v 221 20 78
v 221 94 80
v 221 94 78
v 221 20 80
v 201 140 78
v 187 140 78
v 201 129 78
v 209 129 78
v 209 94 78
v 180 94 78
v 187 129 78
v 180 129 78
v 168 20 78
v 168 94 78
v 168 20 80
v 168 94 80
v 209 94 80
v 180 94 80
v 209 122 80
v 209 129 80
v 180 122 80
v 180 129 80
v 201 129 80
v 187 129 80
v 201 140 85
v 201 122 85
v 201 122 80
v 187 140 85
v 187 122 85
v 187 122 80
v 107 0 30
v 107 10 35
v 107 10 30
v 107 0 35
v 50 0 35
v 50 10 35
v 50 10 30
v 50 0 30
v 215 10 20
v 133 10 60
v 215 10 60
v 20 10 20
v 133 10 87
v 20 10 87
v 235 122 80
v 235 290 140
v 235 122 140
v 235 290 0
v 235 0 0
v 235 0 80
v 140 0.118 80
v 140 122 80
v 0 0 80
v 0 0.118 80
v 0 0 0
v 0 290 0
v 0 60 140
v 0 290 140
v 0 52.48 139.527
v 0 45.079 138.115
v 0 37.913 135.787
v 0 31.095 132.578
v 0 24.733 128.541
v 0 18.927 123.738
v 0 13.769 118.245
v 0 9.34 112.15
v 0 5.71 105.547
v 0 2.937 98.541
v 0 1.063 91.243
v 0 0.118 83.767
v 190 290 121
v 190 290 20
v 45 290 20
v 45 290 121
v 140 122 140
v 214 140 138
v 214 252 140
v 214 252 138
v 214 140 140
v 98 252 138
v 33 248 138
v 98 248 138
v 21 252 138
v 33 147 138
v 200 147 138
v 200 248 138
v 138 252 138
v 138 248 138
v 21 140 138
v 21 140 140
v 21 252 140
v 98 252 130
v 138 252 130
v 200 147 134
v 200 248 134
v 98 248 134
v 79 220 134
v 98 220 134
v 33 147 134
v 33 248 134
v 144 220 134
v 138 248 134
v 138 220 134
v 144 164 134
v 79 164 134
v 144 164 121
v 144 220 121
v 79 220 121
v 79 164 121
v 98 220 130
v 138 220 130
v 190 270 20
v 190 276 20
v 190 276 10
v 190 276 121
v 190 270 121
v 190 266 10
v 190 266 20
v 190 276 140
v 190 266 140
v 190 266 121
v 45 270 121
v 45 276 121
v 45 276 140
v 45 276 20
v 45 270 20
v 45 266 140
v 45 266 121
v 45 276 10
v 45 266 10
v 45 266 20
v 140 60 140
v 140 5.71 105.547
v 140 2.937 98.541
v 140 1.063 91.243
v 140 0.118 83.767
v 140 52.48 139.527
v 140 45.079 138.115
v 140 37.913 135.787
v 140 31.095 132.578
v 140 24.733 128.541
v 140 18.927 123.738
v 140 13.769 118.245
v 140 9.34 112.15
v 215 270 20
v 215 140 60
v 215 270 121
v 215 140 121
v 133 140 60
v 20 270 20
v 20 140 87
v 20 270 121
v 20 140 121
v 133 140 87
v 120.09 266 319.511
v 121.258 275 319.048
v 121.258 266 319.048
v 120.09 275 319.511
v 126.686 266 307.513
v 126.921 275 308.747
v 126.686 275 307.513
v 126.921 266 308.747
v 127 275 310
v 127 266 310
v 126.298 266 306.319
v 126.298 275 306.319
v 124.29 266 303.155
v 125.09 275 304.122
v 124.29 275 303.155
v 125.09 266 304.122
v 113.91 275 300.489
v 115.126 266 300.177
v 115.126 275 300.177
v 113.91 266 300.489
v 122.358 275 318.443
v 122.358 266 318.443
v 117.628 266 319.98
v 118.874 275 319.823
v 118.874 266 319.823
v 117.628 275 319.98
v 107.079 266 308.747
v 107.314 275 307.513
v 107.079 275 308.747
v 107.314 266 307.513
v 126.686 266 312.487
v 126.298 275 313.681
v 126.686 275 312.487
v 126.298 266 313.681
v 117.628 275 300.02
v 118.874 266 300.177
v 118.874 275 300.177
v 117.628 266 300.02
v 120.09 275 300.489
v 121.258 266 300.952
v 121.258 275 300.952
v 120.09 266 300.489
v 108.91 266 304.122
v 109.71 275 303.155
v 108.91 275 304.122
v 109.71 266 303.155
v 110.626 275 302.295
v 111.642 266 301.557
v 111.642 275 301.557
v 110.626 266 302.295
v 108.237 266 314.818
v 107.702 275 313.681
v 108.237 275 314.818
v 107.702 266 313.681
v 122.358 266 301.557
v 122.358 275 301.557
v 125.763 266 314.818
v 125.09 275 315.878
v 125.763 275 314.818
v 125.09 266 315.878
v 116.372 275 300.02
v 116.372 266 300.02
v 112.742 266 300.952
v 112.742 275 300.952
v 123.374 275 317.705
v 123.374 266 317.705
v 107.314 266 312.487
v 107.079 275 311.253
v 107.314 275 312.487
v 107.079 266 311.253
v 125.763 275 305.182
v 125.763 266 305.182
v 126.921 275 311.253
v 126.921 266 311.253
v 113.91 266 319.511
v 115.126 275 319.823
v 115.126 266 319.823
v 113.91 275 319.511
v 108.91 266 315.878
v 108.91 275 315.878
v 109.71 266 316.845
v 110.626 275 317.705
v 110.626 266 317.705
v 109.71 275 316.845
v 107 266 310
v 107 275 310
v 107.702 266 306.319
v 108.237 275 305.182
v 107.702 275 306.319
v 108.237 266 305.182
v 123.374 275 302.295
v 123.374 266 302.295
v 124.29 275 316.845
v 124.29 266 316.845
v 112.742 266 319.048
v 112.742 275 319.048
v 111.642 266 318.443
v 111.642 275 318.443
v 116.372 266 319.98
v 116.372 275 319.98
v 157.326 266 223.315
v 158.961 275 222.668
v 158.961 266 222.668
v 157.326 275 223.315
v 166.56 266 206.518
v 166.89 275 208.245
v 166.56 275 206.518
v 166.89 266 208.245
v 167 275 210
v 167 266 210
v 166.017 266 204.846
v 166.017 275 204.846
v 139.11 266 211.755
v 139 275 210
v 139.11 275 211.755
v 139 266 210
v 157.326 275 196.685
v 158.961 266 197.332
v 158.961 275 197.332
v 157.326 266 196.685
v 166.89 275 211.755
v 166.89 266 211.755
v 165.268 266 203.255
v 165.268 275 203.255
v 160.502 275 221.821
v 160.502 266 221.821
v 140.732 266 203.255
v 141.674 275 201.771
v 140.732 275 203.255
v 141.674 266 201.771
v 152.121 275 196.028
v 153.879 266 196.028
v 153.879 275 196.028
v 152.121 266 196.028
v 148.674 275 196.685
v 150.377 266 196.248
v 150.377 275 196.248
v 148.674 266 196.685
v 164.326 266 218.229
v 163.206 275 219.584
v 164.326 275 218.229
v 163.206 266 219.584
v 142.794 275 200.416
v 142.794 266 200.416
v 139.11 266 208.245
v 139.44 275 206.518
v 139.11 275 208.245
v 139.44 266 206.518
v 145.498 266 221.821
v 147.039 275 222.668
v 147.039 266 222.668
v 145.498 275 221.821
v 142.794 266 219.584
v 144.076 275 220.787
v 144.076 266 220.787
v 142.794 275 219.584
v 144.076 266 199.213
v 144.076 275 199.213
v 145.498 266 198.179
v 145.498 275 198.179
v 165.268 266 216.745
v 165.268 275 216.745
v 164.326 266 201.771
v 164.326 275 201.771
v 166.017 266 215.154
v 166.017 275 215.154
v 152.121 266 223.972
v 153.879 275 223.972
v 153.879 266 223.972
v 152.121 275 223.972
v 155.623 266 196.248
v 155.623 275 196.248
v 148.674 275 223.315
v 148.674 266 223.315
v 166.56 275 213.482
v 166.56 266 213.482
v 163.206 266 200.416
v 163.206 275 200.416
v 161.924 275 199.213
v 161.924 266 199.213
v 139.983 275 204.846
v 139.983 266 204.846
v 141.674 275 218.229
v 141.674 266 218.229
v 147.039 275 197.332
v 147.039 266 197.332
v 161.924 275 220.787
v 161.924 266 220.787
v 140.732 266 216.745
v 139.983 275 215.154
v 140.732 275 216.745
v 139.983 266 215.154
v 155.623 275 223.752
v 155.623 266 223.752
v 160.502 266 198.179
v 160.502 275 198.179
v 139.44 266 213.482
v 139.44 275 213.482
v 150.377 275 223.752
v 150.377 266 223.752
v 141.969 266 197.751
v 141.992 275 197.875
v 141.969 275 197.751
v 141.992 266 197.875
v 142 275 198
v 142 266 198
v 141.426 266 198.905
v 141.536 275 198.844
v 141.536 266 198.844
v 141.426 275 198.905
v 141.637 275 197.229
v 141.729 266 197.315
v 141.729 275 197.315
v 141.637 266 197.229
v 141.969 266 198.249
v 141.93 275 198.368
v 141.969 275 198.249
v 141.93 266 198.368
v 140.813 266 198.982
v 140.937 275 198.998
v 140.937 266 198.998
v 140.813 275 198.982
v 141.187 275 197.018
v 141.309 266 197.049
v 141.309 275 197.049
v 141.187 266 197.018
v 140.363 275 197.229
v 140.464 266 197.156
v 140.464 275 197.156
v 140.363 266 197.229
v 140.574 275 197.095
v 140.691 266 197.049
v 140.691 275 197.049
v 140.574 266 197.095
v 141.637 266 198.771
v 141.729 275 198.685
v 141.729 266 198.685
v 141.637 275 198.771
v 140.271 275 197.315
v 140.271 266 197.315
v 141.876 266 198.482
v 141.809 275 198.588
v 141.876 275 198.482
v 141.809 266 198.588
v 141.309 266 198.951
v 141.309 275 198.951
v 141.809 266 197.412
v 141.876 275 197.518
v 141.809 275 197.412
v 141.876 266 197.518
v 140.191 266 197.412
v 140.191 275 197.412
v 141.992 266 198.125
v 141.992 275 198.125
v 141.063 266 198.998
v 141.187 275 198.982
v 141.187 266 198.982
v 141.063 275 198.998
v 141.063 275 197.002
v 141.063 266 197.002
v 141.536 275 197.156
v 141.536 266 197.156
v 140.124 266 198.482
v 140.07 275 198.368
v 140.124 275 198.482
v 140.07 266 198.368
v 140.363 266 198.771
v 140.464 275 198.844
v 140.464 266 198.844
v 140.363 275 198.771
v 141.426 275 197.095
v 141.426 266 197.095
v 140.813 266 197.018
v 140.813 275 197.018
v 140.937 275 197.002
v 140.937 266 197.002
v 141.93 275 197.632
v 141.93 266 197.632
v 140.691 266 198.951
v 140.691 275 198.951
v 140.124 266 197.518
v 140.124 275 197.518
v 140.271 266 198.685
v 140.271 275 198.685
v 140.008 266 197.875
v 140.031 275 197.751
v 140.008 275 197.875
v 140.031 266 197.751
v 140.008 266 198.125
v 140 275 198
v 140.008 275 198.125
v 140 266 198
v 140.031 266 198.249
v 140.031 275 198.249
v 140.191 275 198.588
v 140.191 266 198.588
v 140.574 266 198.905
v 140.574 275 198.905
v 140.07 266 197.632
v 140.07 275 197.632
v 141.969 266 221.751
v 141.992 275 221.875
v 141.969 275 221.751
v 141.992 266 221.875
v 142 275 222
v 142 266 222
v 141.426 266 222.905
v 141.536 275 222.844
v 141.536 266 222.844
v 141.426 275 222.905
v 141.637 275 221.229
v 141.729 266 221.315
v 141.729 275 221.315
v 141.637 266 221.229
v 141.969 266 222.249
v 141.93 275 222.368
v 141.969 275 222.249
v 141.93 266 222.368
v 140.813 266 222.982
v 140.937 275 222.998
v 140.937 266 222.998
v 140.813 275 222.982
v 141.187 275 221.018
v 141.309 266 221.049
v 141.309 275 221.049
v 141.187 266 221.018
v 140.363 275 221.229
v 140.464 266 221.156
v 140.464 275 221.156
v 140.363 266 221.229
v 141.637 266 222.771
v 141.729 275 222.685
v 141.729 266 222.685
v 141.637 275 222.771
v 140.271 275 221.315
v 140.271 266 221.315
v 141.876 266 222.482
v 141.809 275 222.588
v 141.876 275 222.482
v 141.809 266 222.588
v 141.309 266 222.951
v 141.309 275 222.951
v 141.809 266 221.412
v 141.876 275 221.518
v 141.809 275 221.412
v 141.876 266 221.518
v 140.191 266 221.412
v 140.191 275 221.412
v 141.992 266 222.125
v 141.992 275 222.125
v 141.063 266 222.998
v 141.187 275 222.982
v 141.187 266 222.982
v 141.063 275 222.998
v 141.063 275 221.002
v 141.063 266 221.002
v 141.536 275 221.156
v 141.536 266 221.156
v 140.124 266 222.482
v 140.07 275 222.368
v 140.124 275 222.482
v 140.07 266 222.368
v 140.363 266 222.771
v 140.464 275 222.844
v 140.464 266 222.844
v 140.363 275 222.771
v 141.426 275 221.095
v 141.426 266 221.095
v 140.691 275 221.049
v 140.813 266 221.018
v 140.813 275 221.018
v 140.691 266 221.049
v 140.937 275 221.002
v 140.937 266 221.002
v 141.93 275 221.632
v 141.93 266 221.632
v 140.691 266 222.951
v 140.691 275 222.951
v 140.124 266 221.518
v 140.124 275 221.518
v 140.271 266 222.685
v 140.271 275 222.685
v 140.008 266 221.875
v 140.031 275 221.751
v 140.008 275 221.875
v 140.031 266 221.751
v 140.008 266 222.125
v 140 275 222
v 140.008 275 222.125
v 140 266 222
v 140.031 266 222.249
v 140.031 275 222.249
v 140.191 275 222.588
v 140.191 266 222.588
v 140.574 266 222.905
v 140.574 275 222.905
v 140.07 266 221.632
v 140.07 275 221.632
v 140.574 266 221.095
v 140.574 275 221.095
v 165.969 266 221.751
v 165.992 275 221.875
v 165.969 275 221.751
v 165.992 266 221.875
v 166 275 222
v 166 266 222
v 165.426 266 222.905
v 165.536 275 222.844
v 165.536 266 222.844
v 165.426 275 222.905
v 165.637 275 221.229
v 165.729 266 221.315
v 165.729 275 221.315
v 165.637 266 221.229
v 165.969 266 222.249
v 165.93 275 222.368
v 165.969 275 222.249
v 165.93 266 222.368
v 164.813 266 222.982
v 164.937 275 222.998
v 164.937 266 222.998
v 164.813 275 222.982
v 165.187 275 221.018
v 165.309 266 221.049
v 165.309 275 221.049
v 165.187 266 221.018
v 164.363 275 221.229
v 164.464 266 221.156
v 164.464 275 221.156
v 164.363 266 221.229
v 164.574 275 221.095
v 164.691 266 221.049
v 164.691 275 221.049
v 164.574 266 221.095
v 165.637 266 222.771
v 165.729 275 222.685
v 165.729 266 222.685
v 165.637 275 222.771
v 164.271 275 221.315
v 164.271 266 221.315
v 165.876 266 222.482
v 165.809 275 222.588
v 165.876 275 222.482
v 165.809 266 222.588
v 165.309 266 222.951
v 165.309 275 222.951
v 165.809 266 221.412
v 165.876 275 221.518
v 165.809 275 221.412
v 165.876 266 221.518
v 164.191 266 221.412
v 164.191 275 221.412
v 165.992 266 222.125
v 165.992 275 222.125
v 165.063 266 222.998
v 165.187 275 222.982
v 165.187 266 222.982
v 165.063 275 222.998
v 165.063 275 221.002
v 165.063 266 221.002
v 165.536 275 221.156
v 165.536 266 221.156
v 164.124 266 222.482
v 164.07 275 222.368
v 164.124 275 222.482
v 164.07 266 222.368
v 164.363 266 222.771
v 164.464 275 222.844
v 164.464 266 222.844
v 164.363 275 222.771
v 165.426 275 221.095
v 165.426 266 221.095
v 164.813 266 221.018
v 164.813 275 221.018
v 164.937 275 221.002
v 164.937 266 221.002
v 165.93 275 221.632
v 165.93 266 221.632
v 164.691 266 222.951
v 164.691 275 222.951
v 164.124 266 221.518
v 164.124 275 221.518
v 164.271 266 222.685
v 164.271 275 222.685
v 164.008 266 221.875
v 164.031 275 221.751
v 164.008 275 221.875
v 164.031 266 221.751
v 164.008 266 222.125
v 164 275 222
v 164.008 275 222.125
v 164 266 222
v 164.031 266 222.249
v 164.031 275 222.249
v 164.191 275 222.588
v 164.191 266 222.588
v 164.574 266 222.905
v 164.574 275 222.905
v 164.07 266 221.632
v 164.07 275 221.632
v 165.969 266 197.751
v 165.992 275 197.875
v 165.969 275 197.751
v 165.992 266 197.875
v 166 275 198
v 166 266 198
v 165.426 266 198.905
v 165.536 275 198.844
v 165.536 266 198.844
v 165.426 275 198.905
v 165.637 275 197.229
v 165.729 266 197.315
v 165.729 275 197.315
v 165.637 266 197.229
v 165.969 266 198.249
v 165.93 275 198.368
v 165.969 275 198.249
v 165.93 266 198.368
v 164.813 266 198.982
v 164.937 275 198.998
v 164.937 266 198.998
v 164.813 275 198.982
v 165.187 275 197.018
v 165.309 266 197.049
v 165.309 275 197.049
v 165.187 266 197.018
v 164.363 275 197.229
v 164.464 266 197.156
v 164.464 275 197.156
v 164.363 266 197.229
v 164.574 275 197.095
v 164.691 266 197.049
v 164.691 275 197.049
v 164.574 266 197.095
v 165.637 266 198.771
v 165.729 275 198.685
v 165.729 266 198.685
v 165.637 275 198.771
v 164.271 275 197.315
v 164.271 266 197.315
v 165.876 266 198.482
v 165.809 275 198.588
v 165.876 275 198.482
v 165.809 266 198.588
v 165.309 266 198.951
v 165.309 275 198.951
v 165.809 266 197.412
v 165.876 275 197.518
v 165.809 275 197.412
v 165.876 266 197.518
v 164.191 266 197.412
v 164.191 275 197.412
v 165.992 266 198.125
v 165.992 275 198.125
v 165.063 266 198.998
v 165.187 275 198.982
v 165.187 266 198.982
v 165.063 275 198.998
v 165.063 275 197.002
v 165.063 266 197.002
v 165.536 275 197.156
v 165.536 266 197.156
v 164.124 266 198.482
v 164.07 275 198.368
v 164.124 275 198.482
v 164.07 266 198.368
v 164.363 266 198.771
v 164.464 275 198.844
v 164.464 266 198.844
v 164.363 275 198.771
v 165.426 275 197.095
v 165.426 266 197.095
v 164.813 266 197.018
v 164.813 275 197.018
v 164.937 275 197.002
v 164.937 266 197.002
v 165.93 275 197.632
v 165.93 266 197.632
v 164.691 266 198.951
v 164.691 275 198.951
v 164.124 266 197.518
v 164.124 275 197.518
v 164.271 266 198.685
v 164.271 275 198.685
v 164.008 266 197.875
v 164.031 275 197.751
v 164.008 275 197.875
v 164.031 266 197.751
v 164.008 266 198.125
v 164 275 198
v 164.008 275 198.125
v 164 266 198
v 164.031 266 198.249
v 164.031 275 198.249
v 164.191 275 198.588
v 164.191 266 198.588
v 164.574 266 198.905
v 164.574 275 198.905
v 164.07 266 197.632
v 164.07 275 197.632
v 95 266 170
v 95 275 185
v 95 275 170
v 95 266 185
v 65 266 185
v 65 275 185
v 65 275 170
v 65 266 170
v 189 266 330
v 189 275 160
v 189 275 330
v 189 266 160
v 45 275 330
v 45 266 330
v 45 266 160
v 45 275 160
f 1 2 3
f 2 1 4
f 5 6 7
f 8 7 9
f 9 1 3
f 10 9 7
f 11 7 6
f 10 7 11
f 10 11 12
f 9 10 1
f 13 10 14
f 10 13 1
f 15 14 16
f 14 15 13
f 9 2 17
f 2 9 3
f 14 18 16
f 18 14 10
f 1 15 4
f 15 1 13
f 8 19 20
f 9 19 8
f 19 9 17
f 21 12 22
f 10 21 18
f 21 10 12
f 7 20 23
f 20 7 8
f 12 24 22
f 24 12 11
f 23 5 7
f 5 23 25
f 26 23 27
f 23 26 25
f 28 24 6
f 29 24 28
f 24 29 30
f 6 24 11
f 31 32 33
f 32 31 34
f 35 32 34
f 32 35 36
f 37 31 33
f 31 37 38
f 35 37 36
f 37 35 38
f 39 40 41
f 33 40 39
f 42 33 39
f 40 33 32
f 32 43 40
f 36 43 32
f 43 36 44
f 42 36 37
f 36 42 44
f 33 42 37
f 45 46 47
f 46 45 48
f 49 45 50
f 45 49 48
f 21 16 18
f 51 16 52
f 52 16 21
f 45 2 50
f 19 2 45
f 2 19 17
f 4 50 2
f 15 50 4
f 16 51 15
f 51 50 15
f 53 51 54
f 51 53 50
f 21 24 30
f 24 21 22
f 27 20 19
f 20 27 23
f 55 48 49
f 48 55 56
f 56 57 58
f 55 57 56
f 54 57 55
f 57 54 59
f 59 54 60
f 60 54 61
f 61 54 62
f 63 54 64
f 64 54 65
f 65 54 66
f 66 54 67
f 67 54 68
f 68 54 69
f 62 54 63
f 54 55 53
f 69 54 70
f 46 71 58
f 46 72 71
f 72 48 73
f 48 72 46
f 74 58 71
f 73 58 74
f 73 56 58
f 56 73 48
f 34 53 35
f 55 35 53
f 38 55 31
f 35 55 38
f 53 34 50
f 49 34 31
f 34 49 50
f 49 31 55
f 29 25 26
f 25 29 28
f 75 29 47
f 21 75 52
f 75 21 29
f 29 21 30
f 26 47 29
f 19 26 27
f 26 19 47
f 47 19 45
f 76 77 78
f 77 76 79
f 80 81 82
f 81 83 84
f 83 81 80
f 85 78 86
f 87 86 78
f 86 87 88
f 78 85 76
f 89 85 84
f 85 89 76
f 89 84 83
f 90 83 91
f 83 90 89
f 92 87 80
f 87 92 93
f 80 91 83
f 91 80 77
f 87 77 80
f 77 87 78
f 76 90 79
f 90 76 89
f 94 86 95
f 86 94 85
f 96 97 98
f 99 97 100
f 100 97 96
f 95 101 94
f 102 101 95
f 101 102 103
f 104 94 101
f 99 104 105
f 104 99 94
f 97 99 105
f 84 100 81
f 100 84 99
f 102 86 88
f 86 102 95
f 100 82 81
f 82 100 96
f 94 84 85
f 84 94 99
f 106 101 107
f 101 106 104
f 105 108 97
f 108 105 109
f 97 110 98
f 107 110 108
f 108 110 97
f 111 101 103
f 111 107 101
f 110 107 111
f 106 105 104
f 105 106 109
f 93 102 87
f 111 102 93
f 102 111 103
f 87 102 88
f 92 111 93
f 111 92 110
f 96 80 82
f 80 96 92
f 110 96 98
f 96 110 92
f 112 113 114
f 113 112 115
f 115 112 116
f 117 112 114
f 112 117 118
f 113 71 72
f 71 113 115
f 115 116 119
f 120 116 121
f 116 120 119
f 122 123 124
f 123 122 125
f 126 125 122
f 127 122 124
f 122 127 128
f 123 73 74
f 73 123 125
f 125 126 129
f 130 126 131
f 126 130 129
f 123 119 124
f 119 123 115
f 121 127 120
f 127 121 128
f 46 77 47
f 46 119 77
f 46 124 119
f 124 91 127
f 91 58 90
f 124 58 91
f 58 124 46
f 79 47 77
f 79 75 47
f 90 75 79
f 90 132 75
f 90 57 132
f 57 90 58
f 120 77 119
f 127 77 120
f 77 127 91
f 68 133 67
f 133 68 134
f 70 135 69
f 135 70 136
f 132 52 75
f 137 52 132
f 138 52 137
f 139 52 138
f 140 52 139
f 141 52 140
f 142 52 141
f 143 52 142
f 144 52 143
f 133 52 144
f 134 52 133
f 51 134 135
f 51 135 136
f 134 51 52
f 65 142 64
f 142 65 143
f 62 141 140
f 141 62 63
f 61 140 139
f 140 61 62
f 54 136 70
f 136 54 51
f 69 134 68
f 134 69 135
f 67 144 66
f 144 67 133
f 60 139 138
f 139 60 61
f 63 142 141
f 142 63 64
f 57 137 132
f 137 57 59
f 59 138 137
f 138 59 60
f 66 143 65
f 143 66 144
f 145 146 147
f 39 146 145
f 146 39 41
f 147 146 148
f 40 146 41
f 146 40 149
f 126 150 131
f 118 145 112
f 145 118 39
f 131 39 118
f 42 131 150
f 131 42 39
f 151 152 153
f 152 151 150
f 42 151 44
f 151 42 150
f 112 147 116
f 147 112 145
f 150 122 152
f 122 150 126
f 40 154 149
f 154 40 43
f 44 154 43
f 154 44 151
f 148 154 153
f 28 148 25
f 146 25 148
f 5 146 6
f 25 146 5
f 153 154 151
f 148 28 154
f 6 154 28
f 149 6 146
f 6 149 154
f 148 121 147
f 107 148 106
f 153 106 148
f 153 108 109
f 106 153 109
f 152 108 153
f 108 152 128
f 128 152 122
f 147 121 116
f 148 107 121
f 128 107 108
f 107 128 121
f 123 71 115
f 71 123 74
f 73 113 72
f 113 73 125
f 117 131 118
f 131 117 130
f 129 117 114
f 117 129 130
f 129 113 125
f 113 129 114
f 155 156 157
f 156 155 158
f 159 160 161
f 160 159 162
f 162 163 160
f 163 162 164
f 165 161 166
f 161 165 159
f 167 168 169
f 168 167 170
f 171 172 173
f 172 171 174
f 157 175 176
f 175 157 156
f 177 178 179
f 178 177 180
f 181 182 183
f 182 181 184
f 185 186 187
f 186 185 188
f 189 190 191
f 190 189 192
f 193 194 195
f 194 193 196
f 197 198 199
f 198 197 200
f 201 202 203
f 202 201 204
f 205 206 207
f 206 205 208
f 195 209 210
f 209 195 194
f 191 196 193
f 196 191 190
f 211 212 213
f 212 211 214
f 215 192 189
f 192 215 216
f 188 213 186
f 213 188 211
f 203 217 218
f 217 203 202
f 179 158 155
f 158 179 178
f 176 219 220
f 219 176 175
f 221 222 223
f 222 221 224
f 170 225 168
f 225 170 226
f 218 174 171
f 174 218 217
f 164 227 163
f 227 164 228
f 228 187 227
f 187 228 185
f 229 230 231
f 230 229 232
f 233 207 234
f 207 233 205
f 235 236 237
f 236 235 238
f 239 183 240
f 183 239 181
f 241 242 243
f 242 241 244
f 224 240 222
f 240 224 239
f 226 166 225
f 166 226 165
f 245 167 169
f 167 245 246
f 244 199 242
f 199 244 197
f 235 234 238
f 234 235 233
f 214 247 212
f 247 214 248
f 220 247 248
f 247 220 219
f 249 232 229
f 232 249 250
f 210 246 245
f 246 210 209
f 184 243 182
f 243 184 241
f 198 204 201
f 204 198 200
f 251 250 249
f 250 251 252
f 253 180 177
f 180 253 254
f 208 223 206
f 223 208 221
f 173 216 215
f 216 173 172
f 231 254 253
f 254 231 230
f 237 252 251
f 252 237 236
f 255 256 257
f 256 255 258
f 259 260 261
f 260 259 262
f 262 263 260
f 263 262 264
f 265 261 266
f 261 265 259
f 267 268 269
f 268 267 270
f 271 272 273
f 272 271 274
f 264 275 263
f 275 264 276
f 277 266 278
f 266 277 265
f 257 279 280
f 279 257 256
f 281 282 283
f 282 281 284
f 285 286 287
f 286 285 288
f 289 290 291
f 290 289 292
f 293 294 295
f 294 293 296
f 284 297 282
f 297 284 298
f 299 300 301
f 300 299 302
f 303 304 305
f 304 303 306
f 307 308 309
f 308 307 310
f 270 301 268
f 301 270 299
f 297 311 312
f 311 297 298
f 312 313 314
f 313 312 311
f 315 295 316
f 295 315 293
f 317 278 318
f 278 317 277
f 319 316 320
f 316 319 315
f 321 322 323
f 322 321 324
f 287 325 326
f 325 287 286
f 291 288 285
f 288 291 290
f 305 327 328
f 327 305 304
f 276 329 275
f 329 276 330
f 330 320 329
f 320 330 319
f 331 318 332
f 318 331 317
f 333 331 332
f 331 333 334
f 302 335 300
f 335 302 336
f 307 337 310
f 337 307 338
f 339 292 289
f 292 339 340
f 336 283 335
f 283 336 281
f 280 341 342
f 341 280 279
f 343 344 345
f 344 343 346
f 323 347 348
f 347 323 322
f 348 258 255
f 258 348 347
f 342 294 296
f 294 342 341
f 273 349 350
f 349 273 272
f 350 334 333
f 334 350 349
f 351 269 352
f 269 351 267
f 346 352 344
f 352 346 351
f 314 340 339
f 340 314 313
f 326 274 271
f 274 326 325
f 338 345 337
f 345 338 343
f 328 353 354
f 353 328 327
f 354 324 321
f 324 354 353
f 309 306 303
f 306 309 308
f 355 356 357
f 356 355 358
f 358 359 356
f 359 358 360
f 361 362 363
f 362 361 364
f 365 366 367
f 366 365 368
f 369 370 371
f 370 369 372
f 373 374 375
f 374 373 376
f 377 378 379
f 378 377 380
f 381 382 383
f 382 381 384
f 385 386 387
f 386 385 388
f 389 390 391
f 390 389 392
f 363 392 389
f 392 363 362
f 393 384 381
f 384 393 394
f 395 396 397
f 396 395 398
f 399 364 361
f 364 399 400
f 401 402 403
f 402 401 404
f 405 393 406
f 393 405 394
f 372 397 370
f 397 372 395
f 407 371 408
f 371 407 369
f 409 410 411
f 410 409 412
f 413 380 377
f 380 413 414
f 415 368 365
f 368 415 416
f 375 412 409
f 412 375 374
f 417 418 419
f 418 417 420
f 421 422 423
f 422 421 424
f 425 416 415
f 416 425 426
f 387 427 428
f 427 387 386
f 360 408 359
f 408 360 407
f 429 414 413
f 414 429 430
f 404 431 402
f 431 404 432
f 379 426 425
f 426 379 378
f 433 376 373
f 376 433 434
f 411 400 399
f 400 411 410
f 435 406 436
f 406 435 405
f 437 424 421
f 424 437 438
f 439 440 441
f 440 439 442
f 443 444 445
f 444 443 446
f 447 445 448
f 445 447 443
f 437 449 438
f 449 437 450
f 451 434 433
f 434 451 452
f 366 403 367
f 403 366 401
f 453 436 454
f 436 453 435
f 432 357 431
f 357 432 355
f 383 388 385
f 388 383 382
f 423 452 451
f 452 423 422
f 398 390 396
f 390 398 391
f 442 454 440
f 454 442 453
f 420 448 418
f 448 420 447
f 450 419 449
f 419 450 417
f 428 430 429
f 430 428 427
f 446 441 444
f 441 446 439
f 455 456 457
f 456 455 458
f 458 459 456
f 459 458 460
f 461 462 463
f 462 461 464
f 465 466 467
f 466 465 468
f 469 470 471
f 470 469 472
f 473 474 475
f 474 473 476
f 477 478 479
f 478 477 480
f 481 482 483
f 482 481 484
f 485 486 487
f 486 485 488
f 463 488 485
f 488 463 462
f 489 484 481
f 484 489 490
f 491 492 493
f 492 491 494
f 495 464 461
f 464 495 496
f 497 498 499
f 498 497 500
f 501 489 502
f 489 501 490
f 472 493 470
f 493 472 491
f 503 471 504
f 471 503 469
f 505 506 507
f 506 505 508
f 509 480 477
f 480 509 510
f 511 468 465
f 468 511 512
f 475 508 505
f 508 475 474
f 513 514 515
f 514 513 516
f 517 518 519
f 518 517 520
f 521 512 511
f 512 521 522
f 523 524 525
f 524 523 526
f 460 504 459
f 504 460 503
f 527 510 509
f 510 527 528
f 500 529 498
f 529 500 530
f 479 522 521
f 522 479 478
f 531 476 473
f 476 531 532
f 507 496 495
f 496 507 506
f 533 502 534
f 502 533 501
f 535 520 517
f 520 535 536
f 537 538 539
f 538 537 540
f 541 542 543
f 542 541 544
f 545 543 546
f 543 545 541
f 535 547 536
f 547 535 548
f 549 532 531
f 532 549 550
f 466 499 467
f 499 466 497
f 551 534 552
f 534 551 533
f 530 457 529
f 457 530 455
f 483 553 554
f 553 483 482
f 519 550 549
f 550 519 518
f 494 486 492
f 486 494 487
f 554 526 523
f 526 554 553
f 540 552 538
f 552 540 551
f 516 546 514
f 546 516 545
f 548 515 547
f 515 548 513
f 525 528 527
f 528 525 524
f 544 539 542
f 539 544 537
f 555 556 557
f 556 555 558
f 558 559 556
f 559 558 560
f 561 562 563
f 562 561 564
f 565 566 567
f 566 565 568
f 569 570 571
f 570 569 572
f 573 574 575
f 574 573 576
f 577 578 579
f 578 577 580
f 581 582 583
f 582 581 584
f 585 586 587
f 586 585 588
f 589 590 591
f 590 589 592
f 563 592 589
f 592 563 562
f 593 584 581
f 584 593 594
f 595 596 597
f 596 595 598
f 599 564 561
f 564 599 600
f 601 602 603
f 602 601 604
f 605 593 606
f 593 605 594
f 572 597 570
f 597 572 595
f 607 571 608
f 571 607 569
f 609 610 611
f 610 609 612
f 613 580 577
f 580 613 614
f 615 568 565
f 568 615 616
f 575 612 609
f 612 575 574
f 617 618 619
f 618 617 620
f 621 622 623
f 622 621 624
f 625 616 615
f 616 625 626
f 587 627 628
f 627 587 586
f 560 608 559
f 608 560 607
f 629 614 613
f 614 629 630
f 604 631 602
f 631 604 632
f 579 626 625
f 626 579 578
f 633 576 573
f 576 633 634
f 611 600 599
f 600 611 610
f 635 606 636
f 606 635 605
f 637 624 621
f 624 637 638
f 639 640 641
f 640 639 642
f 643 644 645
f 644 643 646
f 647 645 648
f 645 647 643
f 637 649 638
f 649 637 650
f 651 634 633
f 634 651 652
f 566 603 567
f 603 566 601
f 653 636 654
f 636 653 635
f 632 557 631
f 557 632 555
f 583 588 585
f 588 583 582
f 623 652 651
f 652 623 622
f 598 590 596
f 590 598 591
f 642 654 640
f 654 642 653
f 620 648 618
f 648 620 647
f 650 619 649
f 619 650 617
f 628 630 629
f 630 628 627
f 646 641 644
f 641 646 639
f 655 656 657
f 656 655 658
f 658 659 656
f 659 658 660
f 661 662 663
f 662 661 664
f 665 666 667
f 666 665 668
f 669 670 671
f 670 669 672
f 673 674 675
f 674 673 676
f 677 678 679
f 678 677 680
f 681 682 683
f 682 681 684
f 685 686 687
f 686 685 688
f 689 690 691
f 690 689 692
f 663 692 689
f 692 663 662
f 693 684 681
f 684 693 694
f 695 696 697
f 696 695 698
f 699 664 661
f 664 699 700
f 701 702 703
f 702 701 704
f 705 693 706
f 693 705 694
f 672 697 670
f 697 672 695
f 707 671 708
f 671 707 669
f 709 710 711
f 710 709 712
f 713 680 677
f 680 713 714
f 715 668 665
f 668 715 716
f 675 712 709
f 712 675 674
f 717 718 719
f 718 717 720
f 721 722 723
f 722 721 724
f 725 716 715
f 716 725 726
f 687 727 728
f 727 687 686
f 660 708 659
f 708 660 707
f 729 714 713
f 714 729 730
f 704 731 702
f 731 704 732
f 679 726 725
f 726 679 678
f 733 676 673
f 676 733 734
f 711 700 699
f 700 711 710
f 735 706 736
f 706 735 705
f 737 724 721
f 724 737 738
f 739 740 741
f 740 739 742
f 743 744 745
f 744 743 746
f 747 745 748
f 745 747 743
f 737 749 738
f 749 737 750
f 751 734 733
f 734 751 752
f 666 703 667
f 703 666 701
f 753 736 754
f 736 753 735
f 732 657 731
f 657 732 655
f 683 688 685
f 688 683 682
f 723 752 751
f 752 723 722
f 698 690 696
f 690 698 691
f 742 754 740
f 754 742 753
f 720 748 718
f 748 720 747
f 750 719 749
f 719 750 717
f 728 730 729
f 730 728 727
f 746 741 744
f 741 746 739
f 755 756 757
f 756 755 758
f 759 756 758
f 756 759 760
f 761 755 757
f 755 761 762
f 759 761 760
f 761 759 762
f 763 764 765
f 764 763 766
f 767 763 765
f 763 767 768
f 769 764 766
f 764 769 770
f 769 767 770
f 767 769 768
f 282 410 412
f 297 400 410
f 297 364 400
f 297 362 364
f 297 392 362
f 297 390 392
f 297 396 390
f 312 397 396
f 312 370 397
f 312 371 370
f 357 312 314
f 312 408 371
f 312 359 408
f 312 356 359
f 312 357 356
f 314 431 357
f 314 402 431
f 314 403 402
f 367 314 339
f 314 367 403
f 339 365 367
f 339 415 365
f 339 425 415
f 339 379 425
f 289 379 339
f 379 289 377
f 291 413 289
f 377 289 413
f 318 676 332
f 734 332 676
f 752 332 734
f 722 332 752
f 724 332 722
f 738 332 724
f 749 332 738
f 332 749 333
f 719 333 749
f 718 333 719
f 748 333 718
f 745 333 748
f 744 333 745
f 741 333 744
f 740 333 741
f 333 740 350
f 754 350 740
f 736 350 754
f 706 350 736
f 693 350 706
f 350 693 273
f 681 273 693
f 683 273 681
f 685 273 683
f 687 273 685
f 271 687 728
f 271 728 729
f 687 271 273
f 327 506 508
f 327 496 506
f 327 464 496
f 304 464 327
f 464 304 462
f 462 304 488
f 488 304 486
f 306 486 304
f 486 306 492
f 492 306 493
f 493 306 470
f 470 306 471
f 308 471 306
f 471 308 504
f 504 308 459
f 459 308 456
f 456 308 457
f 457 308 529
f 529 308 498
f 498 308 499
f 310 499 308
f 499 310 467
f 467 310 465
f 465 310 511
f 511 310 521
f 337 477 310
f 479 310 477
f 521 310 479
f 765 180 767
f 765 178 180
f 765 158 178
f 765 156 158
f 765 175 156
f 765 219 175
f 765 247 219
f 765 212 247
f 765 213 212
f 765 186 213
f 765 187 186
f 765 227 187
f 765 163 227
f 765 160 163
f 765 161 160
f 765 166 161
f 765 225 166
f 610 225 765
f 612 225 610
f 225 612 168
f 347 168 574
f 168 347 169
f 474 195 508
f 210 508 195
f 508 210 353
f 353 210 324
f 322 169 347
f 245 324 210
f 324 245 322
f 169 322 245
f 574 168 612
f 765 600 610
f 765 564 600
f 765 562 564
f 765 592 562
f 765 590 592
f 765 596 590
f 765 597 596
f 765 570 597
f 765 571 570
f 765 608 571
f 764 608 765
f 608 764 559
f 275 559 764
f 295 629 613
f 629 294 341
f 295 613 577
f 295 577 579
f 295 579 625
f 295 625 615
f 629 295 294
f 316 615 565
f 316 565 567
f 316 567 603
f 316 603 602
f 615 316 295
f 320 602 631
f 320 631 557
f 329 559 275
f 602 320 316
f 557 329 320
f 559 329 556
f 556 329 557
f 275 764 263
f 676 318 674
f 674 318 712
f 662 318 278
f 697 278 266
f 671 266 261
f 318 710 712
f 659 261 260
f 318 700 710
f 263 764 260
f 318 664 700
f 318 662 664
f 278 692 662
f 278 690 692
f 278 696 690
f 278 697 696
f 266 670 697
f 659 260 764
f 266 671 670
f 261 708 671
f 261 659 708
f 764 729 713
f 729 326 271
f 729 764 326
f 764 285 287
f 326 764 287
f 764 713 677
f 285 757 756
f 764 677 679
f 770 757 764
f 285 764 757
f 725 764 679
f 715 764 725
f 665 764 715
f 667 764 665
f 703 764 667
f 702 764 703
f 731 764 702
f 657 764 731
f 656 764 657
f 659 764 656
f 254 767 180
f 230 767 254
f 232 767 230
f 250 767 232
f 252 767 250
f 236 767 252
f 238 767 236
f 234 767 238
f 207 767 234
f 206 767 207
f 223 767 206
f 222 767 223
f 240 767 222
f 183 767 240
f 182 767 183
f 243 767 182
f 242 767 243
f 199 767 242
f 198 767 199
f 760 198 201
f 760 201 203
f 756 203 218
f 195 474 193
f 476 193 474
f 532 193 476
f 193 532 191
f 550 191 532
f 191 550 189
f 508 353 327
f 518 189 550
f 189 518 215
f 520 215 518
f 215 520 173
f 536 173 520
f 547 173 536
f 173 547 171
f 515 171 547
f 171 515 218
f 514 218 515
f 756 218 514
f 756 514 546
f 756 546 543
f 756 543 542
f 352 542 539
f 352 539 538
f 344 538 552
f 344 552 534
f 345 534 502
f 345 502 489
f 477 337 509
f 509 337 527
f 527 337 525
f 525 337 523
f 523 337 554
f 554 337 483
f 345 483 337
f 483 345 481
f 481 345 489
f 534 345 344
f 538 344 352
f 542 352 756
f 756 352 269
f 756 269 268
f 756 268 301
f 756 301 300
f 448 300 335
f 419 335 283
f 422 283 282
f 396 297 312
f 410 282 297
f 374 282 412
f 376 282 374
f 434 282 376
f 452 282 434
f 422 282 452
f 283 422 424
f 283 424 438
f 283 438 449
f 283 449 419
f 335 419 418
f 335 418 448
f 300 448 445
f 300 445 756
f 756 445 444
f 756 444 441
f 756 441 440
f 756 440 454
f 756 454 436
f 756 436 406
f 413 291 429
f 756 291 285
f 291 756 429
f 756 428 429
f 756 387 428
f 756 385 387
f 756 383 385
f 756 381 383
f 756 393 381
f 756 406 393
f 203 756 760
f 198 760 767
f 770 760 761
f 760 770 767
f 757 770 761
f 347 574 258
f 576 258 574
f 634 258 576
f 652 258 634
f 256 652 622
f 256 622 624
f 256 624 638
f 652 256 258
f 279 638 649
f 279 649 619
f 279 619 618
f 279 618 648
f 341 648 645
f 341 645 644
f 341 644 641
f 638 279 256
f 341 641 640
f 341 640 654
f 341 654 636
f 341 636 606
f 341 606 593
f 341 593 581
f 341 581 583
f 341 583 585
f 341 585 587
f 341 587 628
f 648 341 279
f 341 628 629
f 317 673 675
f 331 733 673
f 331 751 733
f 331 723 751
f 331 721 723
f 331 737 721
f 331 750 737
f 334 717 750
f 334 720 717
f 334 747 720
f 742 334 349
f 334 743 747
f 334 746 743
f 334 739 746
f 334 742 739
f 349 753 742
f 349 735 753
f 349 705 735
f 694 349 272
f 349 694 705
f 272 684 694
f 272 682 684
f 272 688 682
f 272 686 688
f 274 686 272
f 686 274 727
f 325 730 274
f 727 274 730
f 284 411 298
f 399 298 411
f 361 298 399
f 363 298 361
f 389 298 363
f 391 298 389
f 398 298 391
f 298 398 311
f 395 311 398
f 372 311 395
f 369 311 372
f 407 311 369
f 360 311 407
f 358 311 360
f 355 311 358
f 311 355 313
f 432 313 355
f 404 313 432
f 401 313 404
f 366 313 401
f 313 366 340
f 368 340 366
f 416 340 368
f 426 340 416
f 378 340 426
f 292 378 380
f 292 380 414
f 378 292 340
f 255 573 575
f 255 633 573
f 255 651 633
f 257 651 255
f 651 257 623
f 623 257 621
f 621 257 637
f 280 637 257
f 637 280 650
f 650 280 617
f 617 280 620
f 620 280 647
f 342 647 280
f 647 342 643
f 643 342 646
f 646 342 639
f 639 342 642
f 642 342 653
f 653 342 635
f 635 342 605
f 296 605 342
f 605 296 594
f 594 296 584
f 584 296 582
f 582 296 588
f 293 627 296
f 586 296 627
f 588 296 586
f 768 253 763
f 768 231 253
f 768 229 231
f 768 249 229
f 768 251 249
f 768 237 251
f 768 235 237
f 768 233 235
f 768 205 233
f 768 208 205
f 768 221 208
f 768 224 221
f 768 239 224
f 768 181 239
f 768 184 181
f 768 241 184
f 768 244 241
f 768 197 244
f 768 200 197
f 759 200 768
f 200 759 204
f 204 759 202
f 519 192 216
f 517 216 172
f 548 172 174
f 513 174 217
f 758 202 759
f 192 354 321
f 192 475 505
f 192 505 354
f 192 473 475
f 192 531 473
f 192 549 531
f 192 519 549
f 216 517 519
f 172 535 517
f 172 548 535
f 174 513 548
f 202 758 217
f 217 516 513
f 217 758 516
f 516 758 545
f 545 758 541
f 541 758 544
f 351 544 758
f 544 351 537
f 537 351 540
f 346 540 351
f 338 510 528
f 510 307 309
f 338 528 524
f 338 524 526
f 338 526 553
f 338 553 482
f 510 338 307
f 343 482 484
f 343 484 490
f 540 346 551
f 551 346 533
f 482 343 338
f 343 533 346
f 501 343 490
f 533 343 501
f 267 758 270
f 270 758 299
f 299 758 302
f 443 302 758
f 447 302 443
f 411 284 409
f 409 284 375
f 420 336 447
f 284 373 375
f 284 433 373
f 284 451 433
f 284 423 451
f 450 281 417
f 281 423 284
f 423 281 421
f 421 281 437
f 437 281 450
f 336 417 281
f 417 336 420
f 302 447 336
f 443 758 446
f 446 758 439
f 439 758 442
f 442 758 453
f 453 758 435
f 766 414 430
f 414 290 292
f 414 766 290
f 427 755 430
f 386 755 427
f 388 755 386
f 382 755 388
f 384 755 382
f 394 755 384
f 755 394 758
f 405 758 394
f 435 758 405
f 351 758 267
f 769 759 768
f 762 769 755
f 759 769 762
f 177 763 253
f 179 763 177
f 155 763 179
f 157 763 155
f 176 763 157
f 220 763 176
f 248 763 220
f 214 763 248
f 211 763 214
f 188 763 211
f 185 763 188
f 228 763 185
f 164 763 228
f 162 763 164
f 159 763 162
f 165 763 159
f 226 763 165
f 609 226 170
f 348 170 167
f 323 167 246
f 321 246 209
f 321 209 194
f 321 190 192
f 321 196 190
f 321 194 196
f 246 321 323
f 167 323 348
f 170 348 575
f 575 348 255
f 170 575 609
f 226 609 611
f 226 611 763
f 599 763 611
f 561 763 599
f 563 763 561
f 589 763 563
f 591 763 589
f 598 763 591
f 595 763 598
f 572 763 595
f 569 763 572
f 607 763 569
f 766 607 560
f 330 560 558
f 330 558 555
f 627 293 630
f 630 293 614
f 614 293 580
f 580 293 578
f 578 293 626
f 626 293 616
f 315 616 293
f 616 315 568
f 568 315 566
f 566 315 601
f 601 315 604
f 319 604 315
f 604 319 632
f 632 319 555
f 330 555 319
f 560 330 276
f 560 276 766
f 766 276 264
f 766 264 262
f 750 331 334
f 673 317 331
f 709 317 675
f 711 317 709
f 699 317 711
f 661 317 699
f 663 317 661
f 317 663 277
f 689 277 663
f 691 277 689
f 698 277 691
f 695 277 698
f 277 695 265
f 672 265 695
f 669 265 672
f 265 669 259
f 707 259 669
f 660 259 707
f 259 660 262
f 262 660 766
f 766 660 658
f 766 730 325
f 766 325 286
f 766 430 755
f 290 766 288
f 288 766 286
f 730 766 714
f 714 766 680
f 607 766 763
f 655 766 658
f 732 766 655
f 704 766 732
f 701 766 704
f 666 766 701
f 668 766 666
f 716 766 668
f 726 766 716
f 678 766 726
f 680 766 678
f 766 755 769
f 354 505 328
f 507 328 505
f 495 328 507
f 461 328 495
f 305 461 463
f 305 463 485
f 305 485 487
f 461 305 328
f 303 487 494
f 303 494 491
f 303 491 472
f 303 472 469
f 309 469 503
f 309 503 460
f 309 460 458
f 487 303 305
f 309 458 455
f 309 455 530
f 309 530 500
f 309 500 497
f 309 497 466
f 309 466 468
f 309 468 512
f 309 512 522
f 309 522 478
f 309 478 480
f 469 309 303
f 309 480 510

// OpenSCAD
difference() {
    union() {
        difference() {
            cube([235,290,80]); // bottom
            
            union() {
                translate([168,20,78])
                cube([53,74,3]);    // nfc
                translate([180,94,78])
                cube([29,35,3]);    // nfc module
                translate([187,122,78])
                cube([14,20,3]);    // nfc line
                
                translate([50,-1,30])
                cube([57,11,5]);    // printer
            }
        }
        
        translate([0,60,80])
        rotate(a=90,v=[0,1,0]) {
            cylinder(r=60,h=140,$fn=50);    // front
        }
        
        difference() {
            translate([0,60,80])
            cube([140,65,60]);  // front2
        }
        
        difference() {
            translate([0,122,80])
            cube([235,168,60]); // back
            
            union() {
                translate([187,122,79])
                cube([14,20,6]);    // nfc line
                
                translate([21,140,138])
                cube([193,112,3]);  // lcd
                translate([33,147,134])
                cube([167,101,5]);  // lcd bottom
                translate([79,164,120])
                cube([65,56,15]);   // lcd module
                translate([98,220,130])
                cube([40,32,10]);    // lcd line
                
                translate([45,266,120])
                cube([145,10,21]);  // back lid
            }
        }
    }
    
    union() {
        translate([20,10,20])
        cube([195,260,40]); // inside bottom
        
        translate([20,10,60])
        cube([113,130,27]); // inside printer
        translate([20,140,60])
        cube([195,130,61]); // inside lcd
        
        translate([45,266,20])
        cube([145,25,101]); // inside back lid
        translate([45,266,10])
        cube([145,10,11]);  // inside bottom lid
        
    }
}

translate([45,266,160])
difference() {
    cube([144,9,170]);
    
    union() {
        translate([72,-1,150])
        rotate(a=90,v=[-1,0,0]) {
            cylinder(r=10,h=11,$fn=50);
        }
        
        translate([108,-1,50])
        rotate(a=90,v=[-1,0,0]) {
            cylinder(r=14,h=11,$fn=50);
        }
        
        translate([96,-1,38])
        rotate(a=90,v=[-1,0,0]) {
            cylinder(r=1,h=11,$fn=50);
        }
        translate([96,-1,62])
        rotate(a=90,v=[-1,0,0]) {
            cylinder(r=1,h=11,$fn=50);
        }
        translate([120,-1,62])
        rotate(a=90,v=[-1,0,0]) {
            cylinder(r=1,h=11,$fn=50);
        }
        translate([120,-1,38])
        rotate(a=90,v=[-1,0,0]) {
            cylinder(r=1,h=11,$fn=50);
        }
        
        translate([20,-1,10])
        cube([30,11,15]);
    }
}
